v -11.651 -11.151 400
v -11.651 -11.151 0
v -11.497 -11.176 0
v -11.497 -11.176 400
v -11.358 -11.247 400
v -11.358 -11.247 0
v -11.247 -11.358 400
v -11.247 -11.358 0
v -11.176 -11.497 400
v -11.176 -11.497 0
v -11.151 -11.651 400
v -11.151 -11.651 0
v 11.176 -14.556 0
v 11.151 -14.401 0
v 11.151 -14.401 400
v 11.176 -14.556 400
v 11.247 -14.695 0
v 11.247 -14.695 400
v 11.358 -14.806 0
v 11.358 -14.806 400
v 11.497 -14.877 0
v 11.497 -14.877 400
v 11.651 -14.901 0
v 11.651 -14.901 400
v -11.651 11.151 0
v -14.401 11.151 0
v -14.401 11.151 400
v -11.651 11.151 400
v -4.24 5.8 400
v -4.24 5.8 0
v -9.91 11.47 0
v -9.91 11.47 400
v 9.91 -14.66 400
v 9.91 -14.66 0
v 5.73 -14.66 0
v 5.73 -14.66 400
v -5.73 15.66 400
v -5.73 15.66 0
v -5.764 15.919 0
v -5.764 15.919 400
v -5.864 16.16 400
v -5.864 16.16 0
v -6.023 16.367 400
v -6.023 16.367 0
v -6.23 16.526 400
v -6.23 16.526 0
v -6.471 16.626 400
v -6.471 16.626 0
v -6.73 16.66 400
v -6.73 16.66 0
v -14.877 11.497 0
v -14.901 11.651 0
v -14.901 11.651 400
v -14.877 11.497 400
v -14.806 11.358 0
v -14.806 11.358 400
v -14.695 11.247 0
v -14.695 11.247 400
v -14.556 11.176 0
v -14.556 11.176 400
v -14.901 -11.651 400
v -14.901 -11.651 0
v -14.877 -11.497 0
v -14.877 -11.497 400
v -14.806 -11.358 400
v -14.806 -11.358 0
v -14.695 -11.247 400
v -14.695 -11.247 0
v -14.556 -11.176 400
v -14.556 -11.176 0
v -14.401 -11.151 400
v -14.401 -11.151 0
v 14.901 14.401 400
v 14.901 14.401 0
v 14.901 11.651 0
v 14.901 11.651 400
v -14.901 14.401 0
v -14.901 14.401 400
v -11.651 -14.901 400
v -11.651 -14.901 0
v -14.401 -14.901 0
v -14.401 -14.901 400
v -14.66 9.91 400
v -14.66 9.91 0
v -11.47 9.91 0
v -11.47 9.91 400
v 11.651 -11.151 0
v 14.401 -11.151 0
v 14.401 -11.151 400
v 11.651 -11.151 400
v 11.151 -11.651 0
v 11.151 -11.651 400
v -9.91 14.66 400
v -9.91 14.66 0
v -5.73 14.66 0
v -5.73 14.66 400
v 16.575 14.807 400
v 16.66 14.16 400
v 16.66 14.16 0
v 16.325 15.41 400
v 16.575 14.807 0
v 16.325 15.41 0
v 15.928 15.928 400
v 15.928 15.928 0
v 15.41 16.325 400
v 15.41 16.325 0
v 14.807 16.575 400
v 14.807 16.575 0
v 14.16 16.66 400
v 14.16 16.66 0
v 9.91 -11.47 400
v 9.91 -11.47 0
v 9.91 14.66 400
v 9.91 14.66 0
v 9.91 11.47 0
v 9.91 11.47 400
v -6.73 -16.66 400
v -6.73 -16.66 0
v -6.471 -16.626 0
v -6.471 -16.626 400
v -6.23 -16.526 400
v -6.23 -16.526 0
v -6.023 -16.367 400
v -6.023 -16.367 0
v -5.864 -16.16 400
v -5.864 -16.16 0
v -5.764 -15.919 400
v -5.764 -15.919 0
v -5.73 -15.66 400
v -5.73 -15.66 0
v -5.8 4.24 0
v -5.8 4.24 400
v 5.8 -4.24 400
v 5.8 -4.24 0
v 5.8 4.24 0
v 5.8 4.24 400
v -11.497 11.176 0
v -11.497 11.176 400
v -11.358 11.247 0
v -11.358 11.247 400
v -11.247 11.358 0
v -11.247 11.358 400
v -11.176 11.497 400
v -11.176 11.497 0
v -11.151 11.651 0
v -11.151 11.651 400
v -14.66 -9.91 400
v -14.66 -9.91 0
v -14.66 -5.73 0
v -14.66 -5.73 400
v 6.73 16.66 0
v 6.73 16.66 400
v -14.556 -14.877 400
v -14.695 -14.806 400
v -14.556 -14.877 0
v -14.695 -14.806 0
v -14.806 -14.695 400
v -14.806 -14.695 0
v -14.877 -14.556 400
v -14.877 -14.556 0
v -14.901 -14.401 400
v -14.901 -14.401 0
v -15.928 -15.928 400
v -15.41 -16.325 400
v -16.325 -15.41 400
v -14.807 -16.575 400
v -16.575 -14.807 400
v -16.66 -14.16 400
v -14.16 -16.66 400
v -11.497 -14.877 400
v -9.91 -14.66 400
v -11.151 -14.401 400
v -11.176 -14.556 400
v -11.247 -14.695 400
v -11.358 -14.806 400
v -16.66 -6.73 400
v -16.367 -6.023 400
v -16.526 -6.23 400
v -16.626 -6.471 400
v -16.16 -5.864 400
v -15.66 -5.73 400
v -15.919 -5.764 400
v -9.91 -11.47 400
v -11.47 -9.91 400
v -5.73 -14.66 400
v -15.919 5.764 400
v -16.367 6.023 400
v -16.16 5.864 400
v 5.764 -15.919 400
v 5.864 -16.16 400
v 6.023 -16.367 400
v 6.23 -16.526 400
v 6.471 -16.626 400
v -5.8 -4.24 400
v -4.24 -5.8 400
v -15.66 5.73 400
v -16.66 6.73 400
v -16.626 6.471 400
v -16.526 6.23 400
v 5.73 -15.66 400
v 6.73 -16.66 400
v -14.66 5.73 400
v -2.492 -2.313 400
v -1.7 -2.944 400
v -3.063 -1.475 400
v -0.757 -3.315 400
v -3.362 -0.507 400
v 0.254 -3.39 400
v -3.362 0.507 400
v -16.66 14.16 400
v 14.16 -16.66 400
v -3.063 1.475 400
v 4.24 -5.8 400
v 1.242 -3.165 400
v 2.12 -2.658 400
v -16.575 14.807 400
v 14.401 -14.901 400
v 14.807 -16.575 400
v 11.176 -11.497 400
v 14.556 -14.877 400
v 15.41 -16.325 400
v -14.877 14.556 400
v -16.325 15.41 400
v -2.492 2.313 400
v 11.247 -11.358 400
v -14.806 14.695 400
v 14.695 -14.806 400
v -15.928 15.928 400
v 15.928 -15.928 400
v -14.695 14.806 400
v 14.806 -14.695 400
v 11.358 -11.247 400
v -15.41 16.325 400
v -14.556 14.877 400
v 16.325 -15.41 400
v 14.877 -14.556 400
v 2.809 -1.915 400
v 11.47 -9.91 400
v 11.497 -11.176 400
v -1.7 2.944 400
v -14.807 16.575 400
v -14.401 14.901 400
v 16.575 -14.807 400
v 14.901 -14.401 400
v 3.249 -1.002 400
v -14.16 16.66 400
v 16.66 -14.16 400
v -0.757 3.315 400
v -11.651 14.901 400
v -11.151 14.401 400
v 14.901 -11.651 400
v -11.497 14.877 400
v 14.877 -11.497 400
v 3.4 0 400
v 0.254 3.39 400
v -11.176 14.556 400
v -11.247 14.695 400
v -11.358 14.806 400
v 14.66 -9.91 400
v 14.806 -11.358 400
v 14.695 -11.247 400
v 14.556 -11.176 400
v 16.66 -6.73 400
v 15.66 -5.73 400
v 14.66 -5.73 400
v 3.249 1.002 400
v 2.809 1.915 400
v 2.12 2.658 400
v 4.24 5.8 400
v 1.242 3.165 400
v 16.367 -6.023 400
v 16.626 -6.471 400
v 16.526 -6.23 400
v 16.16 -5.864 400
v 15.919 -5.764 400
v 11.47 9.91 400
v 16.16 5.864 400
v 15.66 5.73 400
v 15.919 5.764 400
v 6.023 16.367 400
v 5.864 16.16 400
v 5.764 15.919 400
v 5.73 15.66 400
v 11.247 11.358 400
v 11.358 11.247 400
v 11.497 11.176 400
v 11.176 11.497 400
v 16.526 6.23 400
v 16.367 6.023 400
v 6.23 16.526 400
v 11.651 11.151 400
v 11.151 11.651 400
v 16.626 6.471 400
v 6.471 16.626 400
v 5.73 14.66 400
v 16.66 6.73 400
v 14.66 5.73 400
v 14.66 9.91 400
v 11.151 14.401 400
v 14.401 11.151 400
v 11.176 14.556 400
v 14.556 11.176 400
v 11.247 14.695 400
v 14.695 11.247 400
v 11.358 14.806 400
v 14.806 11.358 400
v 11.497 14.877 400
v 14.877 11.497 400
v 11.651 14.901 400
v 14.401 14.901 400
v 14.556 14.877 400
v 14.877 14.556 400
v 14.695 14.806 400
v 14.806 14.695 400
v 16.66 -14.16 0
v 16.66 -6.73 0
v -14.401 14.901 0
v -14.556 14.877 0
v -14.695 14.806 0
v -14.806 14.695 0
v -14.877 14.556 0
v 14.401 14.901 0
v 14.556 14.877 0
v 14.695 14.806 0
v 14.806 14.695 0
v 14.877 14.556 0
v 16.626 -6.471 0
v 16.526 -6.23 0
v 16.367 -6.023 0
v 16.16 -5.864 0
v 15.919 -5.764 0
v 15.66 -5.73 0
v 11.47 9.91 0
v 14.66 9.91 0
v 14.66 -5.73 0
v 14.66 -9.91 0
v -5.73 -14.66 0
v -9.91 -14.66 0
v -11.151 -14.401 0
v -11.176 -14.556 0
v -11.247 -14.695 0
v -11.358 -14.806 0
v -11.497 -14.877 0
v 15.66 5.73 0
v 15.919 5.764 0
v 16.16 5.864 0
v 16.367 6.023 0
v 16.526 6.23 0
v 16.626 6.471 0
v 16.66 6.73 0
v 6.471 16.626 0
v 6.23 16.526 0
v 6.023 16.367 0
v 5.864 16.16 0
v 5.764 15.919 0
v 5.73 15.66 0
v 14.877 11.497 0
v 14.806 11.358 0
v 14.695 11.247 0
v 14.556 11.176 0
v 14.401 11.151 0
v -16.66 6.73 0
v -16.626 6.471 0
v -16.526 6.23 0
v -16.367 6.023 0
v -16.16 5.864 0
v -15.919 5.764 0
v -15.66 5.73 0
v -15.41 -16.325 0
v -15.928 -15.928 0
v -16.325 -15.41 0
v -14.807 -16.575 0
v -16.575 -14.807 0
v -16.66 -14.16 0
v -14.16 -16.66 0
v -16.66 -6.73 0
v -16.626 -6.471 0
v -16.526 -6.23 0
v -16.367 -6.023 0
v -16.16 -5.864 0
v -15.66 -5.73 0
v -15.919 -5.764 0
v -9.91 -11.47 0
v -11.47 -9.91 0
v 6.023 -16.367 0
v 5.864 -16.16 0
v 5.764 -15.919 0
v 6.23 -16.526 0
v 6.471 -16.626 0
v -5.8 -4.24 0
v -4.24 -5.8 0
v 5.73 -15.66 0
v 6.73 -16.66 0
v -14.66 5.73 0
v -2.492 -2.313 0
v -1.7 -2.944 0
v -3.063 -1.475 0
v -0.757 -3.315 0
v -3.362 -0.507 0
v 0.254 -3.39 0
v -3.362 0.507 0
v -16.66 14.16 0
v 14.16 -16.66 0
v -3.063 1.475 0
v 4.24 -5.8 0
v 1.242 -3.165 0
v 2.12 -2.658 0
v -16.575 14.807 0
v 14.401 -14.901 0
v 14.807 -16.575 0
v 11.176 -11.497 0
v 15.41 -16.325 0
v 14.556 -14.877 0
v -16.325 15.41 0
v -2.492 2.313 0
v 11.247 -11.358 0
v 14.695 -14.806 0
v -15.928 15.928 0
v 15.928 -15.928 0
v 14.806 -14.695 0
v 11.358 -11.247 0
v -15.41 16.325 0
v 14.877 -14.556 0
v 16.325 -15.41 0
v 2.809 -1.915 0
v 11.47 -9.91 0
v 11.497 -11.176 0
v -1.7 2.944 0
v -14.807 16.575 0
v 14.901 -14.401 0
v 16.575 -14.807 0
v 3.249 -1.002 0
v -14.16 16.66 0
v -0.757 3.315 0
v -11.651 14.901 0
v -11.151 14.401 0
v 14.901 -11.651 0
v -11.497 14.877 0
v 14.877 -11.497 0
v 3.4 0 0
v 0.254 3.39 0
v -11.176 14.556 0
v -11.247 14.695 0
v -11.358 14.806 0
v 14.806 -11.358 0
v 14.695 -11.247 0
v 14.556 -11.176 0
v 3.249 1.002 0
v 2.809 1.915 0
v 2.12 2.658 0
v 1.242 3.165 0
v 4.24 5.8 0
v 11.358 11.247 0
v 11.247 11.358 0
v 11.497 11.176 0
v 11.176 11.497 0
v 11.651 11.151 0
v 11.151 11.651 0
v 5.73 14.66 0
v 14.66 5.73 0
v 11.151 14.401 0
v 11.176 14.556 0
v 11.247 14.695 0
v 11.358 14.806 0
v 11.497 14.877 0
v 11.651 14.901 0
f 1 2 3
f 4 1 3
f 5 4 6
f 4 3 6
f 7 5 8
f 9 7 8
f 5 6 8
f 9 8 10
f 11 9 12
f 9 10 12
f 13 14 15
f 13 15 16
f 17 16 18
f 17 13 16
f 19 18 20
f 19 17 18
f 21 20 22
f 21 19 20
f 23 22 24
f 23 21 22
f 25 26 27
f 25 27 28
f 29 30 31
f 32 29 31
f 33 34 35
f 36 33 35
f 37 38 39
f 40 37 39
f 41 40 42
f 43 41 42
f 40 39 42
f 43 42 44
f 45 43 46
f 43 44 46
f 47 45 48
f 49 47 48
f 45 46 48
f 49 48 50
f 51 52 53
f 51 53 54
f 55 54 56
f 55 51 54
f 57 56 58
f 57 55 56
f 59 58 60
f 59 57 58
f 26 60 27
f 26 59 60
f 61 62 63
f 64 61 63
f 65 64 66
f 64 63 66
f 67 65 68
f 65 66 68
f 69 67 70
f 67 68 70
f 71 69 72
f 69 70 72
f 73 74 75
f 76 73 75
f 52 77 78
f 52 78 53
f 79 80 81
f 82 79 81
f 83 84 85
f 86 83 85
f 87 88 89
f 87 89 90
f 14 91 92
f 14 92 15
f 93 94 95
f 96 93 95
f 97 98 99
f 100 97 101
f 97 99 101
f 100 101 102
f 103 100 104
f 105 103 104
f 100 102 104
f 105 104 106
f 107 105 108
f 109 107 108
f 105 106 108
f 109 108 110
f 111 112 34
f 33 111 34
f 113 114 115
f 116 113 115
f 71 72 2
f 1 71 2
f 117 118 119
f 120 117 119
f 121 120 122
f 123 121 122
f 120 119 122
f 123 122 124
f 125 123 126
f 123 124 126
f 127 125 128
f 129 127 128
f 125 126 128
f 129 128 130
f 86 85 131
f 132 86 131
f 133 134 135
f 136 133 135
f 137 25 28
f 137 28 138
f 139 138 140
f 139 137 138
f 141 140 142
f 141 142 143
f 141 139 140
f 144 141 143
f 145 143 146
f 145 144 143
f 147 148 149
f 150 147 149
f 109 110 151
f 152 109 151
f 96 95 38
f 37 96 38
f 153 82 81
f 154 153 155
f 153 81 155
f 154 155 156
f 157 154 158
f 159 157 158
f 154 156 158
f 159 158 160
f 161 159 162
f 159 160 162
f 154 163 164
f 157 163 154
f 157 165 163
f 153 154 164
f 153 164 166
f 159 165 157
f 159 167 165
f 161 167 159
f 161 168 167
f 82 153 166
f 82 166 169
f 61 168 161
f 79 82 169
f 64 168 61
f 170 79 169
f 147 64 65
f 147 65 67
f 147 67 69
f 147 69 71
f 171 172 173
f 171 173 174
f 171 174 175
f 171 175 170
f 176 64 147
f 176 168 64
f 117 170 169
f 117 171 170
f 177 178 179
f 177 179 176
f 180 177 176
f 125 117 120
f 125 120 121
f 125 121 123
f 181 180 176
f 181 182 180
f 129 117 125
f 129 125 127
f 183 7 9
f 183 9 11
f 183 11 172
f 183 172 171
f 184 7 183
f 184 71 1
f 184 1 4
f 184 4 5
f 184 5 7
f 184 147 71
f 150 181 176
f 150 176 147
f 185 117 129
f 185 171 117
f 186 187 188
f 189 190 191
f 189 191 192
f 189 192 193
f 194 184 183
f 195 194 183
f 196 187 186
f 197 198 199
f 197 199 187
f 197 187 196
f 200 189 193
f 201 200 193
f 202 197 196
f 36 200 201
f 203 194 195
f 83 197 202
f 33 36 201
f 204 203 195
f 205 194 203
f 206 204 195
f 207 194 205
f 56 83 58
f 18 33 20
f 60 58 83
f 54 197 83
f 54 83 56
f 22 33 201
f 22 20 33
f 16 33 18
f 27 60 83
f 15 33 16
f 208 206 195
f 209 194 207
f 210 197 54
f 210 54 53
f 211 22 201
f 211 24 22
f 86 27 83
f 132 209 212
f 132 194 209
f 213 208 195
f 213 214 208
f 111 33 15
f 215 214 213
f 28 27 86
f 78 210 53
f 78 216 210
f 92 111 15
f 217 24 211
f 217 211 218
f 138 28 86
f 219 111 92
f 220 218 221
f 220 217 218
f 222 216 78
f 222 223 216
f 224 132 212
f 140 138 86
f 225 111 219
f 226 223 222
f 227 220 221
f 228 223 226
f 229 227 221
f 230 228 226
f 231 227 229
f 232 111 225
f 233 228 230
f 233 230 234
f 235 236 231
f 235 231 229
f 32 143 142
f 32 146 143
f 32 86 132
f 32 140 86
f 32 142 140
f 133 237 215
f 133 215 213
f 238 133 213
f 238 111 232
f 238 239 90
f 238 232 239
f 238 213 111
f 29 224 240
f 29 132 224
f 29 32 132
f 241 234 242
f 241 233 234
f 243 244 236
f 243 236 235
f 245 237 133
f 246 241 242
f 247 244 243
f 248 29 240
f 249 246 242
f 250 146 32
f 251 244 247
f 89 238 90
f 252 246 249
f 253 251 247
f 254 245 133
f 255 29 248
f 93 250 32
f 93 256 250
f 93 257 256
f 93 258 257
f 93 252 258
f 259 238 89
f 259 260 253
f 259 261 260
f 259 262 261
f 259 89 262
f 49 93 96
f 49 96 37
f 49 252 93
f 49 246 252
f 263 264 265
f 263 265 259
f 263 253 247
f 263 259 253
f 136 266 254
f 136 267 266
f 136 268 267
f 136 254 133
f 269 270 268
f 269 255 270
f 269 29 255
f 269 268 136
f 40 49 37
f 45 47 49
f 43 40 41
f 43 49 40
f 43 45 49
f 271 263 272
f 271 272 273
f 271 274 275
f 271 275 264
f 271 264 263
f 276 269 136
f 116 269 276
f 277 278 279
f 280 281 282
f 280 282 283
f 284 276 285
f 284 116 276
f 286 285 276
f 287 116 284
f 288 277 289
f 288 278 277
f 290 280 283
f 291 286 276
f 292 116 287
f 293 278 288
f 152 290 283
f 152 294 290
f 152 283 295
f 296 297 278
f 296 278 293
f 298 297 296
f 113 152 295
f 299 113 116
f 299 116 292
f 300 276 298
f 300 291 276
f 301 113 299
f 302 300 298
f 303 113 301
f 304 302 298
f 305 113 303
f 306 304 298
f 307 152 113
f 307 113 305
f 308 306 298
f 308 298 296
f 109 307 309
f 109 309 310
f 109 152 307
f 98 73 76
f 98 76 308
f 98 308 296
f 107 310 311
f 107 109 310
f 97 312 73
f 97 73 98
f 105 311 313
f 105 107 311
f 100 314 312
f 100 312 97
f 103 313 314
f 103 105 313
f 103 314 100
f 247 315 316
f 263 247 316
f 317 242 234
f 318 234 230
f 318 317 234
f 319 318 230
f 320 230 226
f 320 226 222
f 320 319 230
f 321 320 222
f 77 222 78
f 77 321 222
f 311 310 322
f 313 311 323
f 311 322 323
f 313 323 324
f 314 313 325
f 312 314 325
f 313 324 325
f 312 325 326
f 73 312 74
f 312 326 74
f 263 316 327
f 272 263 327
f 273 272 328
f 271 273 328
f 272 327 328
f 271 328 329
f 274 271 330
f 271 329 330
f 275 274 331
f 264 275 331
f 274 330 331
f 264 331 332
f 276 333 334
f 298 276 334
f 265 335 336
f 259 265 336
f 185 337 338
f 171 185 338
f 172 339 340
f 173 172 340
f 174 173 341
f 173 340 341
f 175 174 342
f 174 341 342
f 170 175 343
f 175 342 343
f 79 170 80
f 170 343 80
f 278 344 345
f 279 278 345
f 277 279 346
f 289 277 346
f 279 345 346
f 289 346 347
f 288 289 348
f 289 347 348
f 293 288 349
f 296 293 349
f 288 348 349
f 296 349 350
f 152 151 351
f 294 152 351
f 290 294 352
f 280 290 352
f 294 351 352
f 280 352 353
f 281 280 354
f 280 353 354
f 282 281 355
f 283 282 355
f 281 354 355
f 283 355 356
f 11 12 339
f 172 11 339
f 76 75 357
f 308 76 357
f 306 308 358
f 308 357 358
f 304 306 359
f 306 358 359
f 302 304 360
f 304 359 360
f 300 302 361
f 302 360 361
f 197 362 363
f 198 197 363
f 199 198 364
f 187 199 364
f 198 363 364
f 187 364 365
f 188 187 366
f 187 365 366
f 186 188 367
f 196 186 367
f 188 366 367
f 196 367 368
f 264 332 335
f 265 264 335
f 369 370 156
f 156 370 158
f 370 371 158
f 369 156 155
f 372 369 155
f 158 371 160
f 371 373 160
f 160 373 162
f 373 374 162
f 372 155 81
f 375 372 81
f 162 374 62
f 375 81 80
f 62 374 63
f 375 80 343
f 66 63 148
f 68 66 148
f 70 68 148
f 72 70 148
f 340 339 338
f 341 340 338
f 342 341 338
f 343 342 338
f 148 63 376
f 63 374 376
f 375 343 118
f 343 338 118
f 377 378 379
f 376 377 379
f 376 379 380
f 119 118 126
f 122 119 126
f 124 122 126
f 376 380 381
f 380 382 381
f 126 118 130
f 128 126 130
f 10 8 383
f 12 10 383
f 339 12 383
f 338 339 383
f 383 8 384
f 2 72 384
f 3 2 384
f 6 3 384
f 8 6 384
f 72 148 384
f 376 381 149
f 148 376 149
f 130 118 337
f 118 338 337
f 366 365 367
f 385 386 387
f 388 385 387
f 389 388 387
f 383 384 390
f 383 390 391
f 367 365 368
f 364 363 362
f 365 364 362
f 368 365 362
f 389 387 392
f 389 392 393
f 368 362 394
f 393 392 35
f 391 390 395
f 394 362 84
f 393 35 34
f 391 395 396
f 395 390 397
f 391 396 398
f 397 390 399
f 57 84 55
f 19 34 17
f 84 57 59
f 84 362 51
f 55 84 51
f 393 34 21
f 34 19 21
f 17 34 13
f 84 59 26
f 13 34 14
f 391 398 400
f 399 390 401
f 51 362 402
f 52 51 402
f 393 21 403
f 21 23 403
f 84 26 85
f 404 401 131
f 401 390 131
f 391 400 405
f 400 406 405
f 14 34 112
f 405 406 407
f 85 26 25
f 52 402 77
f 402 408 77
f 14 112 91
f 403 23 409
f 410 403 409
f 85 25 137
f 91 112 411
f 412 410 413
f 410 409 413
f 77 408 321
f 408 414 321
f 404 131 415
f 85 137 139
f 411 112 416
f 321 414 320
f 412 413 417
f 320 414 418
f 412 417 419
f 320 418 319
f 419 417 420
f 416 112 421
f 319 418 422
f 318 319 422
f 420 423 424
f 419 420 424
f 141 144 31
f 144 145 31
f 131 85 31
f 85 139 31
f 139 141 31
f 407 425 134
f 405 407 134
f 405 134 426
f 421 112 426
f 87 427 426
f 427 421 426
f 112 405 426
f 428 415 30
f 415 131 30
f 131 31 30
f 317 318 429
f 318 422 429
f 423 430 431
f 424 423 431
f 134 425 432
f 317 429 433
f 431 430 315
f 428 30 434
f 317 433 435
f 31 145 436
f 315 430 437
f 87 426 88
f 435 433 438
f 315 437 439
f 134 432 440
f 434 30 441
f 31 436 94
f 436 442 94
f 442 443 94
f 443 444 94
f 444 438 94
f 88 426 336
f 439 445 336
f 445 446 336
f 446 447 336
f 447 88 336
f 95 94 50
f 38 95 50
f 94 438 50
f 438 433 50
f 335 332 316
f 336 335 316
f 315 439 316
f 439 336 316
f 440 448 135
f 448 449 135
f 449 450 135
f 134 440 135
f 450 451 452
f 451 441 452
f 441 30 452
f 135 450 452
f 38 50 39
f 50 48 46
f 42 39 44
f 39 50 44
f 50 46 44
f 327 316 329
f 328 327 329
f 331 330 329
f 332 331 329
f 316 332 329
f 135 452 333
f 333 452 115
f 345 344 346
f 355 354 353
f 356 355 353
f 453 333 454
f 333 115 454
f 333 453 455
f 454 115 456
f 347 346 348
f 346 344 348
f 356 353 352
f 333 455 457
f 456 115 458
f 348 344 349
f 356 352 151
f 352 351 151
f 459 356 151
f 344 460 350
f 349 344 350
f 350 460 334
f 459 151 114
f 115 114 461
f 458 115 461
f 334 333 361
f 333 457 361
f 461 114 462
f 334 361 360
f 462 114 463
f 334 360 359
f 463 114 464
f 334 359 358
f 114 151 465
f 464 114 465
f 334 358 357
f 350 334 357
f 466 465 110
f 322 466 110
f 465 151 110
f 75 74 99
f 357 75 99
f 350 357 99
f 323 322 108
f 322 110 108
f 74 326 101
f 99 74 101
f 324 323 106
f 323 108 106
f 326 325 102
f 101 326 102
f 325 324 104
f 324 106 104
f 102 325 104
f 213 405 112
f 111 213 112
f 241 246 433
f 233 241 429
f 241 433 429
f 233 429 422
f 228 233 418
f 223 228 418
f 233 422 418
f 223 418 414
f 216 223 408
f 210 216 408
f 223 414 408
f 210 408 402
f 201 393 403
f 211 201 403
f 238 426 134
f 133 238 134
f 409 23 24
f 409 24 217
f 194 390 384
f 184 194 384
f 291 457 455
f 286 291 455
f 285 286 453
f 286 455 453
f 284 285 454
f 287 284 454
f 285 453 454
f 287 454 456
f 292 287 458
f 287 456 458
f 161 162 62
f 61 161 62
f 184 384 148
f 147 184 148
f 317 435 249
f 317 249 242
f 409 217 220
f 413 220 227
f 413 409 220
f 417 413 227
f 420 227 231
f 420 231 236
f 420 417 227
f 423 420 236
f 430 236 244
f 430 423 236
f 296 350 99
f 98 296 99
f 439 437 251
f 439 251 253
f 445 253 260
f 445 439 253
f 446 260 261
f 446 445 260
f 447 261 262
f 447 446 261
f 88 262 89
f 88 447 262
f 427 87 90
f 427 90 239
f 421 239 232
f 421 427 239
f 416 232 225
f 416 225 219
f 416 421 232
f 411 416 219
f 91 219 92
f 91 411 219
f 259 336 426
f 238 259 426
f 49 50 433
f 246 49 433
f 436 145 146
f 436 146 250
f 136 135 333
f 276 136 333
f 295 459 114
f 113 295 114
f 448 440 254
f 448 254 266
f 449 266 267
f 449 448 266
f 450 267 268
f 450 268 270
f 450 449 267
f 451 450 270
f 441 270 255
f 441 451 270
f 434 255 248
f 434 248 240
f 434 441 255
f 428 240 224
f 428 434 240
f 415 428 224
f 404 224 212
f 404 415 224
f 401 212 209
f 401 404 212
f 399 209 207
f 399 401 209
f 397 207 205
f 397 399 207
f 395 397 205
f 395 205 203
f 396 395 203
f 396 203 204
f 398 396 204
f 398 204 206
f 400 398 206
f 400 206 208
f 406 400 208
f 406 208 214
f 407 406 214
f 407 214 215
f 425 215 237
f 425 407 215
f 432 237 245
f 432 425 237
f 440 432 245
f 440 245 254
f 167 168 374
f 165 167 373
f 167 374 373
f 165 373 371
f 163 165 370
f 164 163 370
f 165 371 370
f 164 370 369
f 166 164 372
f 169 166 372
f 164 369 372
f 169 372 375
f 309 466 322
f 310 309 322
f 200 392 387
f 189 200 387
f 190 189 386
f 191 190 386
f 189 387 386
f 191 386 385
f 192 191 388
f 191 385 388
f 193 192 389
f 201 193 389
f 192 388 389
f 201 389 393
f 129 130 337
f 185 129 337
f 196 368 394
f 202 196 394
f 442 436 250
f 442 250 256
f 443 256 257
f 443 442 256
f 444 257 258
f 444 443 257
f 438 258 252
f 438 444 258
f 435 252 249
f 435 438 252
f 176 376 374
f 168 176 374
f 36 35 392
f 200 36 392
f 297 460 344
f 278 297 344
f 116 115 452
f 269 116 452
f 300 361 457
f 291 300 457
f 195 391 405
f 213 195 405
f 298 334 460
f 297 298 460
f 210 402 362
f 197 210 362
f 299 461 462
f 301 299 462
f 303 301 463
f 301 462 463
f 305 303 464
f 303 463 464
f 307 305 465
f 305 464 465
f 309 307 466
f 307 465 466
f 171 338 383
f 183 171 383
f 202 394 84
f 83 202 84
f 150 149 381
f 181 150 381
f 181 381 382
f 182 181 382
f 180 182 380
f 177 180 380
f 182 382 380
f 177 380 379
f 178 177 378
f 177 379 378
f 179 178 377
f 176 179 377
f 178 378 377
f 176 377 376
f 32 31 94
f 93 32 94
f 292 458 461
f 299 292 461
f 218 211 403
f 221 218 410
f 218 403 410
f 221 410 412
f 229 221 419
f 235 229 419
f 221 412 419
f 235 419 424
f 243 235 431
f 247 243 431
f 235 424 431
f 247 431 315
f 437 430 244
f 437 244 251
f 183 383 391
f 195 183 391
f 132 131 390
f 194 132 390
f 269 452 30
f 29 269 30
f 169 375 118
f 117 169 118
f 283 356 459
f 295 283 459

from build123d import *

# Parameters (mm, degrees)
CROQUIS1_R              = 3.4
SALIENTE_EXTRUIR1_DEPTH = 400


with BuildPart() as part:
    # Croquis1 → Saliente-Extruir1 (new body)
    with BuildSketch(Plane.XY):
        with BuildLine():
            Line((5.8, -4.24), (5.8, 4.24))
            Line((5.8, 4.24), (11.47, 9.91))
            Line((11.47, 9.91), (14.66, 9.91))
            Line((14.66, 9.91), (14.66, 5.73))
            Line((14.66, 5.73), (15.66, 5.73))
            ThreePointArc((15.66, 5.73), (16.367106781, 6.022893219), (16.66, 6.73))
            Line((16.66, 6.73), (16.66, 14.16))
            ThreePointArc((16.66, 14.16), (15.927766953, 15.927766953), (14.16, 16.66))
            Line((14.16, 16.66), (6.73, 16.66))
            ThreePointArc((6.73, 16.66), (6.022893219, 16.367106781), (5.73, 15.66))
            Line((5.73, 15.66), (5.73, 14.66))
            Line((5.73, 14.66), (9.91, 14.66))
            Line((9.91, 14.66), (9.91, 11.47))
            Line((9.91, 11.47), (4.24, 5.8))
            Line((4.24, 5.8), (-4.24, 5.8))
            Line((-4.24, 5.8), (-9.91, 11.47))
            Line((-9.91, 11.47), (-9.91, 14.66))
            Line((-9.91, 14.66), (-5.73, 14.66))
            Line((-5.73, 14.66), (-5.73, 15.66))
            ThreePointArc((-5.73, 15.66), (-6.022893219, 16.367106781), (-6.73, 16.66))
            Line((-6.73, 16.66), (-14.16, 16.66))
            ThreePointArc((-14.16, 16.66), (-15.927766953, 15.927766953), (-16.66, 14.16))
            Line((-16.66, 14.16), (-16.66, 6.73))
            ThreePointArc((-16.66, 6.73), (-16.367106781, 6.022893219), (-15.66, 5.73))
            Line((-15.66, 5.73), (-14.66, 5.73))
            Line((-14.66, 5.73), (-14.66, 9.91))
            Line((-14.66, 9.91), (-11.47, 9.91))
            Line((-11.47, 9.91), (-5.8, 4.24))
            Line((-5.8, 4.24), (-5.8, -4.24))
            Line((-5.8, -4.24), (-11.47, -9.91))
            Line((-11.47, -9.91), (-14.66, -9.91))
            Line((-14.66, -9.91), (-14.66, -5.73))
            Line((-14.66, -5.73), (-15.66, -5.73))
            ThreePointArc((-15.66, -5.73), (-16.367106781, -6.022893219), (-16.66, -6.73))
            Line((-16.66, -6.73), (-16.66, -14.16))
            ThreePointArc((-16.66, -14.16), (-15.927766953, -15.927766953), (-14.16, -16.66))
            Line((-14.16, -16.66), (-6.73, -16.66))
            ThreePointArc((-6.73, -16.66), (-6.022893219, -16.367106781), (-5.73, -15.66))
            Line((-5.73, -15.66), (-5.73, -14.66))
            Line((-5.73, -14.66), (-9.91, -14.66))
            Line((-9.91, -14.66), (-9.91, -11.47))
            Line((-9.91, -11.47), (-4.24, -5.8))
            Line((-4.24, -5.8), (4.24, -5.8))
            Line((4.24, -5.8), (9.91, -11.47))
            Line((9.91, -11.47), (9.91, -14.66))
            Line((9.91, -14.66), (5.73, -14.66))
            Line((5.73, -14.66), (5.73, -15.66))
            ThreePointArc((5.73, -15.66), (6.022893219, -16.367106781), (6.73, -16.66))
            Line((6.73, -16.66), (14.16, -16.66))
            ThreePointArc((14.16, -16.66), (15.927766953, -15.927766953), (16.66, -14.16))
            Line((16.66, -14.16), (16.66, -6.73))
            ThreePointArc((16.66, -6.73), (16.367106781, -6.022893219), (15.66, -5.73))
            Line((15.66, -5.73), (14.66, -5.73))
            Line((14.66, -5.73), (14.66, -9.91))
            Line((14.66, -9.91), (11.47, -9.91))
            Line((11.47, -9.91), (5.8, -4.24))
        make_face()
        Circle(CROQUIS1_R, mode=Mode.SUBTRACT)
        with BuildLine():
            Line((11.651495134, 14.901495134), (14.401495134, 14.901495134))
            ThreePointArc((14.401495134, 14.901495134), (14.755048524, 14.755048524), (14.901495134, 14.401495134))
            Line((14.901495134, 14.401495134), (14.901495134, 11.651495134))
            ThreePointArc((14.901495134, 11.651495134), (14.755048524, 11.297941743), (14.401495134, 11.151495134))
            Line((14.401495134, 11.151495134), (11.651495134, 11.151495134))
            ThreePointArc((11.651495134, 11.151495134), (11.297941743, 11.297941743), (11.151495134, 11.651495134))
            Line((11.151495134, 11.651495134), (11.151495134, 14.401495134))
            ThreePointArc((11.151495134, 14.401495134), (11.297941743, 14.755048524), (11.651495134, 14.901495134))
        make_face(mode=Mode.SUBTRACT)
        with BuildLine():
            Line((-14.901495134, 14.401495134), (-14.901495134, 11.651495134))
            ThreePointArc((-14.901495134, 11.651495134), (-14.755048524, 11.297941743), (-14.401495134, 11.151495134))
            Line((-14.401495134, 11.151495134), (-11.651495134, 11.151495134))
            ThreePointArc((-11.651495134, 11.151495134), (-11.297941743, 11.297941743), (-11.151495134, 11.651495134))
            Line((-11.151495134, 11.651495134), (-11.151495134, 14.401495134))
            ThreePointArc((-11.151495134, 14.401495134), (-11.297941743, 14.755048524), (-11.651495134, 14.901495134))
            Line((-11.651495134, 14.901495134), (-14.401495134, 14.901495134))
            ThreePointArc((-14.401495134, 14.901495134), (-14.755048524, 14.755048524), (-14.901495134, 14.401495134))
        make_face(mode=Mode.SUBTRACT)
        with BuildLine():
            Line((-11.651495134, -14.901495134), (-14.401495134, -14.901495134))
            ThreePointArc((-14.401495134, -14.901495134), (-14.755048524, -14.755048524), (-14.901495134, -14.401495134))
            Line((-14.901495134, -14.401495134), (-14.901495134, -11.651495134))
            ThreePointArc((-14.901495134, -11.651495134), (-14.755048524, -11.297941743), (-14.401495134, -11.151495134))
            Line((-14.401495134, -11.151495134), (-11.651495134, -11.151495134))
            ThreePointArc((-11.651495134, -11.151495134), (-11.297941743, -11.297941743), (-11.151495134, -11.651495134))
            Line((-11.151495134, -11.651495134), (-11.151495134, -14.401495134))
            ThreePointArc((-11.151495134, -14.401495134), (-11.297941743, -14.755048524), (-11.651495134, -14.901495134))
        make_face(mode=Mode.SUBTRACT)
        with BuildLine():
            Line((14.901495134, -14.401495134), (14.901495134, -11.651495134))
            ThreePointArc((14.901495134, -11.651495134), (14.755048524, -11.297941743), (14.401495134, -11.151495134))
            Line((14.401495134, -11.151495134), (11.651495134, -11.151495134))
            ThreePointArc((11.651495134, -11.151495134), (11.297941743, -11.297941743), (11.151495134, -11.651495134))
            Line((11.151495134, -11.651495134), (11.151495134, -14.401495134))
            ThreePointArc((11.151495134, -14.401495134), (11.297941743, -14.755048524), (11.651495134, -14.901495134))
            Line((11.651495134, -14.901495134), (14.401495134, -14.901495134))
            ThreePointArc((14.401495134, -14.901495134), (14.755048524, -14.755048524), (14.901495134, -14.401495134))
        make_face(mode=Mode.SUBTRACT)
    extrude(amount=SALIENTE_EXTRUIR1_DEPTH)


solid = part.part
